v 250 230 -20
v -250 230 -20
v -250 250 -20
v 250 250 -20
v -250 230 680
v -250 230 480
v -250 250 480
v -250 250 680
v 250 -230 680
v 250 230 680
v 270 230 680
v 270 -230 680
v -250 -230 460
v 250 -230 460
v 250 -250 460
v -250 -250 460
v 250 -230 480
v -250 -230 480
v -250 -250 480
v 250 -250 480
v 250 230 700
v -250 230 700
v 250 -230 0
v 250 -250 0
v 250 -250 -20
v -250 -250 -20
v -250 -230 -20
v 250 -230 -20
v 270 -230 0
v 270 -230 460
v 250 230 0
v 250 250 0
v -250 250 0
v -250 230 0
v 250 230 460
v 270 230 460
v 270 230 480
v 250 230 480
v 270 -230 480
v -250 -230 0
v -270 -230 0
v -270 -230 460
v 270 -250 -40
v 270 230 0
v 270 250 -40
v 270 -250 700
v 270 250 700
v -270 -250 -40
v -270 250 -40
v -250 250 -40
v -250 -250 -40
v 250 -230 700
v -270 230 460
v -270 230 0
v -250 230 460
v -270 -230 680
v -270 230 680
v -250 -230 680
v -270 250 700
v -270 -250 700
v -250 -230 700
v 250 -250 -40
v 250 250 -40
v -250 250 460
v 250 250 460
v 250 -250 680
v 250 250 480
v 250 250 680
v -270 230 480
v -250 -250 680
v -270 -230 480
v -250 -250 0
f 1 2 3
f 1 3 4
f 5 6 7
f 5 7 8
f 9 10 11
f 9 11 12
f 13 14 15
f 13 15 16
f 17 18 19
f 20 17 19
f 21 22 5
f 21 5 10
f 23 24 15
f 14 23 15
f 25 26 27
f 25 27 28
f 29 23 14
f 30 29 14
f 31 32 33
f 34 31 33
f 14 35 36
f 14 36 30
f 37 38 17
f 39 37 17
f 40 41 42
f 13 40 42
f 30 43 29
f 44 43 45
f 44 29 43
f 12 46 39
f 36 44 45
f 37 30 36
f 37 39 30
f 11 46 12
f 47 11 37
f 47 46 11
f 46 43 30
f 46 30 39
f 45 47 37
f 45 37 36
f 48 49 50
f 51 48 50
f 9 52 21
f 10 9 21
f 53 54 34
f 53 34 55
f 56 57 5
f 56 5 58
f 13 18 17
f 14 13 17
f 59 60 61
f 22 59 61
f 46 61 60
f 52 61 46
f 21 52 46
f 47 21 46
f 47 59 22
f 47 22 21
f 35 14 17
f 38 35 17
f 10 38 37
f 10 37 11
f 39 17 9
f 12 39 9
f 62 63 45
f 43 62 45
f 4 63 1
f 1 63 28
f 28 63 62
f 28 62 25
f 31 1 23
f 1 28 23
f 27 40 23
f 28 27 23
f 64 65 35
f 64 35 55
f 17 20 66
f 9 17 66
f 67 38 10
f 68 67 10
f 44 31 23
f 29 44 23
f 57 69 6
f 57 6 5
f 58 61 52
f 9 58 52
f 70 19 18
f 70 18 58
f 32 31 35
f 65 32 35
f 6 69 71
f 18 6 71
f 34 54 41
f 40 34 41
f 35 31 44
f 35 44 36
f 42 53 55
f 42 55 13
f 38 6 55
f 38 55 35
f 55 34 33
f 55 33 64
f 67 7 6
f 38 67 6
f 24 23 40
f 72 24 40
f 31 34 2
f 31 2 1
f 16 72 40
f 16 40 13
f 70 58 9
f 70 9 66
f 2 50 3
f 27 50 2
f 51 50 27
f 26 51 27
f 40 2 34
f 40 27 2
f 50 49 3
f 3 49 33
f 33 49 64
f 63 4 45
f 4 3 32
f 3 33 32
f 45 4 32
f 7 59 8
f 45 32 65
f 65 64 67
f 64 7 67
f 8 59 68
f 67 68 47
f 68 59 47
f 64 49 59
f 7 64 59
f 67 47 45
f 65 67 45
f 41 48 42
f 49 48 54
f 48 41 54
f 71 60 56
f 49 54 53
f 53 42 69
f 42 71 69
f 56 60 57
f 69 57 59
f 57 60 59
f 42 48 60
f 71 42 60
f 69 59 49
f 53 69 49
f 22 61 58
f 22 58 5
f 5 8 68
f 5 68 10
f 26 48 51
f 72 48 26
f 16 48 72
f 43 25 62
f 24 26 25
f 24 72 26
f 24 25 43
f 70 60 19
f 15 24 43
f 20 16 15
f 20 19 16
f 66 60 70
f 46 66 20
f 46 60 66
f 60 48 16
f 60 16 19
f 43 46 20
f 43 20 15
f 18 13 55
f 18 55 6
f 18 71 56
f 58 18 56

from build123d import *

# Parameters (mm, degrees)
F0_W          = 540
F0_H          = 500
F1_DEPTH      = 700
F1_DEPTH_BACK = 40
F2_W          = 500
F2_H          = 20
F3_DEPTH      = 500.001
F4_W          = 500
F4_H          = 200
F5_DEPTH      = 500.001
F6_W          = 460
F6_H          = 200
F7_DEPTH      = 540.001
F8_W          = 500
F8_H          = 460
F9_DEPTH      = 740.001
F10_W         = 500
F10_H         = 460
F11_DEPTH     = 500.001
F12_W         = 460
F12_H         = 460
F13_DEPTH     = 540.001


with BuildPart() as f1:
    # F0 (on Top) → F1 (new body, two sides)
    with BuildSketch(Plane.XY) as f1_sk:
        Rectangle(F0_W, F0_H)
    extrude(amount=F1_DEPTH)
    extrude(f1_sk.sketch, amount=-F1_DEPTH_BACK)

    # F2 (on face) → F3 (cut, through all)
    with BuildSketch(Plane.XZ.offset(250)):
        with Locations((0, -30)):
            Rectangle(F2_W, F2_H)
    extrude(amount=-F3_DEPTH, mode=Mode.SUBTRACT)

    # F4 (on face) → F5 (cut, through all)
    with BuildSketch(Plane.XZ.offset(250)):
        with Locations((0, 580)):
            Rectangle(F4_W, F4_H)
    extrude(amount=-F5_DEPTH, mode=Mode.SUBTRACT)

    # F6 (on face) → F7 (cut, through all)
    with BuildSketch(Plane(origin=(-270, 0, 0), x_dir=(0, -1, 0), z_dir=(-1, 0, 0))):
        with Locations((0, 580)):
            Rectangle(F6_W, F6_H)
    extrude(amount=-F7_DEPTH, mode=Mode.SUBTRACT)

    # F8 (on face) → F9 (cut, through all)
    with BuildSketch(Plane.XY.offset(700)):
        Rectangle(F8_W, F8_H)
    extrude(amount=-F9_DEPTH, mode=Mode.SUBTRACT)

    # F10 (on face) → F11 (cut, through all)
    with BuildSketch(Plane(origin=(0, 250, 0), x_dir=(-1, 0, 0), z_dir=(0, 1, 0))):
        with Locations((0, 230)):
            Rectangle(F10_W, F10_H)
    extrude(amount=-F11_DEPTH, mode=Mode.SUBTRACT)

    # F12 (on face) → F13 (cut, through all)
    with BuildSketch(Plane(origin=(-270, 0, 0), x_dir=(0, -1, 0), z_dir=(-1, 0, 0))):
        with Locations((0, 230)):
            Rectangle(F12_W, F12_H)
    extrude(amount=-F13_DEPTH, mode=Mode.SUBTRACT)


solid = f1.part
